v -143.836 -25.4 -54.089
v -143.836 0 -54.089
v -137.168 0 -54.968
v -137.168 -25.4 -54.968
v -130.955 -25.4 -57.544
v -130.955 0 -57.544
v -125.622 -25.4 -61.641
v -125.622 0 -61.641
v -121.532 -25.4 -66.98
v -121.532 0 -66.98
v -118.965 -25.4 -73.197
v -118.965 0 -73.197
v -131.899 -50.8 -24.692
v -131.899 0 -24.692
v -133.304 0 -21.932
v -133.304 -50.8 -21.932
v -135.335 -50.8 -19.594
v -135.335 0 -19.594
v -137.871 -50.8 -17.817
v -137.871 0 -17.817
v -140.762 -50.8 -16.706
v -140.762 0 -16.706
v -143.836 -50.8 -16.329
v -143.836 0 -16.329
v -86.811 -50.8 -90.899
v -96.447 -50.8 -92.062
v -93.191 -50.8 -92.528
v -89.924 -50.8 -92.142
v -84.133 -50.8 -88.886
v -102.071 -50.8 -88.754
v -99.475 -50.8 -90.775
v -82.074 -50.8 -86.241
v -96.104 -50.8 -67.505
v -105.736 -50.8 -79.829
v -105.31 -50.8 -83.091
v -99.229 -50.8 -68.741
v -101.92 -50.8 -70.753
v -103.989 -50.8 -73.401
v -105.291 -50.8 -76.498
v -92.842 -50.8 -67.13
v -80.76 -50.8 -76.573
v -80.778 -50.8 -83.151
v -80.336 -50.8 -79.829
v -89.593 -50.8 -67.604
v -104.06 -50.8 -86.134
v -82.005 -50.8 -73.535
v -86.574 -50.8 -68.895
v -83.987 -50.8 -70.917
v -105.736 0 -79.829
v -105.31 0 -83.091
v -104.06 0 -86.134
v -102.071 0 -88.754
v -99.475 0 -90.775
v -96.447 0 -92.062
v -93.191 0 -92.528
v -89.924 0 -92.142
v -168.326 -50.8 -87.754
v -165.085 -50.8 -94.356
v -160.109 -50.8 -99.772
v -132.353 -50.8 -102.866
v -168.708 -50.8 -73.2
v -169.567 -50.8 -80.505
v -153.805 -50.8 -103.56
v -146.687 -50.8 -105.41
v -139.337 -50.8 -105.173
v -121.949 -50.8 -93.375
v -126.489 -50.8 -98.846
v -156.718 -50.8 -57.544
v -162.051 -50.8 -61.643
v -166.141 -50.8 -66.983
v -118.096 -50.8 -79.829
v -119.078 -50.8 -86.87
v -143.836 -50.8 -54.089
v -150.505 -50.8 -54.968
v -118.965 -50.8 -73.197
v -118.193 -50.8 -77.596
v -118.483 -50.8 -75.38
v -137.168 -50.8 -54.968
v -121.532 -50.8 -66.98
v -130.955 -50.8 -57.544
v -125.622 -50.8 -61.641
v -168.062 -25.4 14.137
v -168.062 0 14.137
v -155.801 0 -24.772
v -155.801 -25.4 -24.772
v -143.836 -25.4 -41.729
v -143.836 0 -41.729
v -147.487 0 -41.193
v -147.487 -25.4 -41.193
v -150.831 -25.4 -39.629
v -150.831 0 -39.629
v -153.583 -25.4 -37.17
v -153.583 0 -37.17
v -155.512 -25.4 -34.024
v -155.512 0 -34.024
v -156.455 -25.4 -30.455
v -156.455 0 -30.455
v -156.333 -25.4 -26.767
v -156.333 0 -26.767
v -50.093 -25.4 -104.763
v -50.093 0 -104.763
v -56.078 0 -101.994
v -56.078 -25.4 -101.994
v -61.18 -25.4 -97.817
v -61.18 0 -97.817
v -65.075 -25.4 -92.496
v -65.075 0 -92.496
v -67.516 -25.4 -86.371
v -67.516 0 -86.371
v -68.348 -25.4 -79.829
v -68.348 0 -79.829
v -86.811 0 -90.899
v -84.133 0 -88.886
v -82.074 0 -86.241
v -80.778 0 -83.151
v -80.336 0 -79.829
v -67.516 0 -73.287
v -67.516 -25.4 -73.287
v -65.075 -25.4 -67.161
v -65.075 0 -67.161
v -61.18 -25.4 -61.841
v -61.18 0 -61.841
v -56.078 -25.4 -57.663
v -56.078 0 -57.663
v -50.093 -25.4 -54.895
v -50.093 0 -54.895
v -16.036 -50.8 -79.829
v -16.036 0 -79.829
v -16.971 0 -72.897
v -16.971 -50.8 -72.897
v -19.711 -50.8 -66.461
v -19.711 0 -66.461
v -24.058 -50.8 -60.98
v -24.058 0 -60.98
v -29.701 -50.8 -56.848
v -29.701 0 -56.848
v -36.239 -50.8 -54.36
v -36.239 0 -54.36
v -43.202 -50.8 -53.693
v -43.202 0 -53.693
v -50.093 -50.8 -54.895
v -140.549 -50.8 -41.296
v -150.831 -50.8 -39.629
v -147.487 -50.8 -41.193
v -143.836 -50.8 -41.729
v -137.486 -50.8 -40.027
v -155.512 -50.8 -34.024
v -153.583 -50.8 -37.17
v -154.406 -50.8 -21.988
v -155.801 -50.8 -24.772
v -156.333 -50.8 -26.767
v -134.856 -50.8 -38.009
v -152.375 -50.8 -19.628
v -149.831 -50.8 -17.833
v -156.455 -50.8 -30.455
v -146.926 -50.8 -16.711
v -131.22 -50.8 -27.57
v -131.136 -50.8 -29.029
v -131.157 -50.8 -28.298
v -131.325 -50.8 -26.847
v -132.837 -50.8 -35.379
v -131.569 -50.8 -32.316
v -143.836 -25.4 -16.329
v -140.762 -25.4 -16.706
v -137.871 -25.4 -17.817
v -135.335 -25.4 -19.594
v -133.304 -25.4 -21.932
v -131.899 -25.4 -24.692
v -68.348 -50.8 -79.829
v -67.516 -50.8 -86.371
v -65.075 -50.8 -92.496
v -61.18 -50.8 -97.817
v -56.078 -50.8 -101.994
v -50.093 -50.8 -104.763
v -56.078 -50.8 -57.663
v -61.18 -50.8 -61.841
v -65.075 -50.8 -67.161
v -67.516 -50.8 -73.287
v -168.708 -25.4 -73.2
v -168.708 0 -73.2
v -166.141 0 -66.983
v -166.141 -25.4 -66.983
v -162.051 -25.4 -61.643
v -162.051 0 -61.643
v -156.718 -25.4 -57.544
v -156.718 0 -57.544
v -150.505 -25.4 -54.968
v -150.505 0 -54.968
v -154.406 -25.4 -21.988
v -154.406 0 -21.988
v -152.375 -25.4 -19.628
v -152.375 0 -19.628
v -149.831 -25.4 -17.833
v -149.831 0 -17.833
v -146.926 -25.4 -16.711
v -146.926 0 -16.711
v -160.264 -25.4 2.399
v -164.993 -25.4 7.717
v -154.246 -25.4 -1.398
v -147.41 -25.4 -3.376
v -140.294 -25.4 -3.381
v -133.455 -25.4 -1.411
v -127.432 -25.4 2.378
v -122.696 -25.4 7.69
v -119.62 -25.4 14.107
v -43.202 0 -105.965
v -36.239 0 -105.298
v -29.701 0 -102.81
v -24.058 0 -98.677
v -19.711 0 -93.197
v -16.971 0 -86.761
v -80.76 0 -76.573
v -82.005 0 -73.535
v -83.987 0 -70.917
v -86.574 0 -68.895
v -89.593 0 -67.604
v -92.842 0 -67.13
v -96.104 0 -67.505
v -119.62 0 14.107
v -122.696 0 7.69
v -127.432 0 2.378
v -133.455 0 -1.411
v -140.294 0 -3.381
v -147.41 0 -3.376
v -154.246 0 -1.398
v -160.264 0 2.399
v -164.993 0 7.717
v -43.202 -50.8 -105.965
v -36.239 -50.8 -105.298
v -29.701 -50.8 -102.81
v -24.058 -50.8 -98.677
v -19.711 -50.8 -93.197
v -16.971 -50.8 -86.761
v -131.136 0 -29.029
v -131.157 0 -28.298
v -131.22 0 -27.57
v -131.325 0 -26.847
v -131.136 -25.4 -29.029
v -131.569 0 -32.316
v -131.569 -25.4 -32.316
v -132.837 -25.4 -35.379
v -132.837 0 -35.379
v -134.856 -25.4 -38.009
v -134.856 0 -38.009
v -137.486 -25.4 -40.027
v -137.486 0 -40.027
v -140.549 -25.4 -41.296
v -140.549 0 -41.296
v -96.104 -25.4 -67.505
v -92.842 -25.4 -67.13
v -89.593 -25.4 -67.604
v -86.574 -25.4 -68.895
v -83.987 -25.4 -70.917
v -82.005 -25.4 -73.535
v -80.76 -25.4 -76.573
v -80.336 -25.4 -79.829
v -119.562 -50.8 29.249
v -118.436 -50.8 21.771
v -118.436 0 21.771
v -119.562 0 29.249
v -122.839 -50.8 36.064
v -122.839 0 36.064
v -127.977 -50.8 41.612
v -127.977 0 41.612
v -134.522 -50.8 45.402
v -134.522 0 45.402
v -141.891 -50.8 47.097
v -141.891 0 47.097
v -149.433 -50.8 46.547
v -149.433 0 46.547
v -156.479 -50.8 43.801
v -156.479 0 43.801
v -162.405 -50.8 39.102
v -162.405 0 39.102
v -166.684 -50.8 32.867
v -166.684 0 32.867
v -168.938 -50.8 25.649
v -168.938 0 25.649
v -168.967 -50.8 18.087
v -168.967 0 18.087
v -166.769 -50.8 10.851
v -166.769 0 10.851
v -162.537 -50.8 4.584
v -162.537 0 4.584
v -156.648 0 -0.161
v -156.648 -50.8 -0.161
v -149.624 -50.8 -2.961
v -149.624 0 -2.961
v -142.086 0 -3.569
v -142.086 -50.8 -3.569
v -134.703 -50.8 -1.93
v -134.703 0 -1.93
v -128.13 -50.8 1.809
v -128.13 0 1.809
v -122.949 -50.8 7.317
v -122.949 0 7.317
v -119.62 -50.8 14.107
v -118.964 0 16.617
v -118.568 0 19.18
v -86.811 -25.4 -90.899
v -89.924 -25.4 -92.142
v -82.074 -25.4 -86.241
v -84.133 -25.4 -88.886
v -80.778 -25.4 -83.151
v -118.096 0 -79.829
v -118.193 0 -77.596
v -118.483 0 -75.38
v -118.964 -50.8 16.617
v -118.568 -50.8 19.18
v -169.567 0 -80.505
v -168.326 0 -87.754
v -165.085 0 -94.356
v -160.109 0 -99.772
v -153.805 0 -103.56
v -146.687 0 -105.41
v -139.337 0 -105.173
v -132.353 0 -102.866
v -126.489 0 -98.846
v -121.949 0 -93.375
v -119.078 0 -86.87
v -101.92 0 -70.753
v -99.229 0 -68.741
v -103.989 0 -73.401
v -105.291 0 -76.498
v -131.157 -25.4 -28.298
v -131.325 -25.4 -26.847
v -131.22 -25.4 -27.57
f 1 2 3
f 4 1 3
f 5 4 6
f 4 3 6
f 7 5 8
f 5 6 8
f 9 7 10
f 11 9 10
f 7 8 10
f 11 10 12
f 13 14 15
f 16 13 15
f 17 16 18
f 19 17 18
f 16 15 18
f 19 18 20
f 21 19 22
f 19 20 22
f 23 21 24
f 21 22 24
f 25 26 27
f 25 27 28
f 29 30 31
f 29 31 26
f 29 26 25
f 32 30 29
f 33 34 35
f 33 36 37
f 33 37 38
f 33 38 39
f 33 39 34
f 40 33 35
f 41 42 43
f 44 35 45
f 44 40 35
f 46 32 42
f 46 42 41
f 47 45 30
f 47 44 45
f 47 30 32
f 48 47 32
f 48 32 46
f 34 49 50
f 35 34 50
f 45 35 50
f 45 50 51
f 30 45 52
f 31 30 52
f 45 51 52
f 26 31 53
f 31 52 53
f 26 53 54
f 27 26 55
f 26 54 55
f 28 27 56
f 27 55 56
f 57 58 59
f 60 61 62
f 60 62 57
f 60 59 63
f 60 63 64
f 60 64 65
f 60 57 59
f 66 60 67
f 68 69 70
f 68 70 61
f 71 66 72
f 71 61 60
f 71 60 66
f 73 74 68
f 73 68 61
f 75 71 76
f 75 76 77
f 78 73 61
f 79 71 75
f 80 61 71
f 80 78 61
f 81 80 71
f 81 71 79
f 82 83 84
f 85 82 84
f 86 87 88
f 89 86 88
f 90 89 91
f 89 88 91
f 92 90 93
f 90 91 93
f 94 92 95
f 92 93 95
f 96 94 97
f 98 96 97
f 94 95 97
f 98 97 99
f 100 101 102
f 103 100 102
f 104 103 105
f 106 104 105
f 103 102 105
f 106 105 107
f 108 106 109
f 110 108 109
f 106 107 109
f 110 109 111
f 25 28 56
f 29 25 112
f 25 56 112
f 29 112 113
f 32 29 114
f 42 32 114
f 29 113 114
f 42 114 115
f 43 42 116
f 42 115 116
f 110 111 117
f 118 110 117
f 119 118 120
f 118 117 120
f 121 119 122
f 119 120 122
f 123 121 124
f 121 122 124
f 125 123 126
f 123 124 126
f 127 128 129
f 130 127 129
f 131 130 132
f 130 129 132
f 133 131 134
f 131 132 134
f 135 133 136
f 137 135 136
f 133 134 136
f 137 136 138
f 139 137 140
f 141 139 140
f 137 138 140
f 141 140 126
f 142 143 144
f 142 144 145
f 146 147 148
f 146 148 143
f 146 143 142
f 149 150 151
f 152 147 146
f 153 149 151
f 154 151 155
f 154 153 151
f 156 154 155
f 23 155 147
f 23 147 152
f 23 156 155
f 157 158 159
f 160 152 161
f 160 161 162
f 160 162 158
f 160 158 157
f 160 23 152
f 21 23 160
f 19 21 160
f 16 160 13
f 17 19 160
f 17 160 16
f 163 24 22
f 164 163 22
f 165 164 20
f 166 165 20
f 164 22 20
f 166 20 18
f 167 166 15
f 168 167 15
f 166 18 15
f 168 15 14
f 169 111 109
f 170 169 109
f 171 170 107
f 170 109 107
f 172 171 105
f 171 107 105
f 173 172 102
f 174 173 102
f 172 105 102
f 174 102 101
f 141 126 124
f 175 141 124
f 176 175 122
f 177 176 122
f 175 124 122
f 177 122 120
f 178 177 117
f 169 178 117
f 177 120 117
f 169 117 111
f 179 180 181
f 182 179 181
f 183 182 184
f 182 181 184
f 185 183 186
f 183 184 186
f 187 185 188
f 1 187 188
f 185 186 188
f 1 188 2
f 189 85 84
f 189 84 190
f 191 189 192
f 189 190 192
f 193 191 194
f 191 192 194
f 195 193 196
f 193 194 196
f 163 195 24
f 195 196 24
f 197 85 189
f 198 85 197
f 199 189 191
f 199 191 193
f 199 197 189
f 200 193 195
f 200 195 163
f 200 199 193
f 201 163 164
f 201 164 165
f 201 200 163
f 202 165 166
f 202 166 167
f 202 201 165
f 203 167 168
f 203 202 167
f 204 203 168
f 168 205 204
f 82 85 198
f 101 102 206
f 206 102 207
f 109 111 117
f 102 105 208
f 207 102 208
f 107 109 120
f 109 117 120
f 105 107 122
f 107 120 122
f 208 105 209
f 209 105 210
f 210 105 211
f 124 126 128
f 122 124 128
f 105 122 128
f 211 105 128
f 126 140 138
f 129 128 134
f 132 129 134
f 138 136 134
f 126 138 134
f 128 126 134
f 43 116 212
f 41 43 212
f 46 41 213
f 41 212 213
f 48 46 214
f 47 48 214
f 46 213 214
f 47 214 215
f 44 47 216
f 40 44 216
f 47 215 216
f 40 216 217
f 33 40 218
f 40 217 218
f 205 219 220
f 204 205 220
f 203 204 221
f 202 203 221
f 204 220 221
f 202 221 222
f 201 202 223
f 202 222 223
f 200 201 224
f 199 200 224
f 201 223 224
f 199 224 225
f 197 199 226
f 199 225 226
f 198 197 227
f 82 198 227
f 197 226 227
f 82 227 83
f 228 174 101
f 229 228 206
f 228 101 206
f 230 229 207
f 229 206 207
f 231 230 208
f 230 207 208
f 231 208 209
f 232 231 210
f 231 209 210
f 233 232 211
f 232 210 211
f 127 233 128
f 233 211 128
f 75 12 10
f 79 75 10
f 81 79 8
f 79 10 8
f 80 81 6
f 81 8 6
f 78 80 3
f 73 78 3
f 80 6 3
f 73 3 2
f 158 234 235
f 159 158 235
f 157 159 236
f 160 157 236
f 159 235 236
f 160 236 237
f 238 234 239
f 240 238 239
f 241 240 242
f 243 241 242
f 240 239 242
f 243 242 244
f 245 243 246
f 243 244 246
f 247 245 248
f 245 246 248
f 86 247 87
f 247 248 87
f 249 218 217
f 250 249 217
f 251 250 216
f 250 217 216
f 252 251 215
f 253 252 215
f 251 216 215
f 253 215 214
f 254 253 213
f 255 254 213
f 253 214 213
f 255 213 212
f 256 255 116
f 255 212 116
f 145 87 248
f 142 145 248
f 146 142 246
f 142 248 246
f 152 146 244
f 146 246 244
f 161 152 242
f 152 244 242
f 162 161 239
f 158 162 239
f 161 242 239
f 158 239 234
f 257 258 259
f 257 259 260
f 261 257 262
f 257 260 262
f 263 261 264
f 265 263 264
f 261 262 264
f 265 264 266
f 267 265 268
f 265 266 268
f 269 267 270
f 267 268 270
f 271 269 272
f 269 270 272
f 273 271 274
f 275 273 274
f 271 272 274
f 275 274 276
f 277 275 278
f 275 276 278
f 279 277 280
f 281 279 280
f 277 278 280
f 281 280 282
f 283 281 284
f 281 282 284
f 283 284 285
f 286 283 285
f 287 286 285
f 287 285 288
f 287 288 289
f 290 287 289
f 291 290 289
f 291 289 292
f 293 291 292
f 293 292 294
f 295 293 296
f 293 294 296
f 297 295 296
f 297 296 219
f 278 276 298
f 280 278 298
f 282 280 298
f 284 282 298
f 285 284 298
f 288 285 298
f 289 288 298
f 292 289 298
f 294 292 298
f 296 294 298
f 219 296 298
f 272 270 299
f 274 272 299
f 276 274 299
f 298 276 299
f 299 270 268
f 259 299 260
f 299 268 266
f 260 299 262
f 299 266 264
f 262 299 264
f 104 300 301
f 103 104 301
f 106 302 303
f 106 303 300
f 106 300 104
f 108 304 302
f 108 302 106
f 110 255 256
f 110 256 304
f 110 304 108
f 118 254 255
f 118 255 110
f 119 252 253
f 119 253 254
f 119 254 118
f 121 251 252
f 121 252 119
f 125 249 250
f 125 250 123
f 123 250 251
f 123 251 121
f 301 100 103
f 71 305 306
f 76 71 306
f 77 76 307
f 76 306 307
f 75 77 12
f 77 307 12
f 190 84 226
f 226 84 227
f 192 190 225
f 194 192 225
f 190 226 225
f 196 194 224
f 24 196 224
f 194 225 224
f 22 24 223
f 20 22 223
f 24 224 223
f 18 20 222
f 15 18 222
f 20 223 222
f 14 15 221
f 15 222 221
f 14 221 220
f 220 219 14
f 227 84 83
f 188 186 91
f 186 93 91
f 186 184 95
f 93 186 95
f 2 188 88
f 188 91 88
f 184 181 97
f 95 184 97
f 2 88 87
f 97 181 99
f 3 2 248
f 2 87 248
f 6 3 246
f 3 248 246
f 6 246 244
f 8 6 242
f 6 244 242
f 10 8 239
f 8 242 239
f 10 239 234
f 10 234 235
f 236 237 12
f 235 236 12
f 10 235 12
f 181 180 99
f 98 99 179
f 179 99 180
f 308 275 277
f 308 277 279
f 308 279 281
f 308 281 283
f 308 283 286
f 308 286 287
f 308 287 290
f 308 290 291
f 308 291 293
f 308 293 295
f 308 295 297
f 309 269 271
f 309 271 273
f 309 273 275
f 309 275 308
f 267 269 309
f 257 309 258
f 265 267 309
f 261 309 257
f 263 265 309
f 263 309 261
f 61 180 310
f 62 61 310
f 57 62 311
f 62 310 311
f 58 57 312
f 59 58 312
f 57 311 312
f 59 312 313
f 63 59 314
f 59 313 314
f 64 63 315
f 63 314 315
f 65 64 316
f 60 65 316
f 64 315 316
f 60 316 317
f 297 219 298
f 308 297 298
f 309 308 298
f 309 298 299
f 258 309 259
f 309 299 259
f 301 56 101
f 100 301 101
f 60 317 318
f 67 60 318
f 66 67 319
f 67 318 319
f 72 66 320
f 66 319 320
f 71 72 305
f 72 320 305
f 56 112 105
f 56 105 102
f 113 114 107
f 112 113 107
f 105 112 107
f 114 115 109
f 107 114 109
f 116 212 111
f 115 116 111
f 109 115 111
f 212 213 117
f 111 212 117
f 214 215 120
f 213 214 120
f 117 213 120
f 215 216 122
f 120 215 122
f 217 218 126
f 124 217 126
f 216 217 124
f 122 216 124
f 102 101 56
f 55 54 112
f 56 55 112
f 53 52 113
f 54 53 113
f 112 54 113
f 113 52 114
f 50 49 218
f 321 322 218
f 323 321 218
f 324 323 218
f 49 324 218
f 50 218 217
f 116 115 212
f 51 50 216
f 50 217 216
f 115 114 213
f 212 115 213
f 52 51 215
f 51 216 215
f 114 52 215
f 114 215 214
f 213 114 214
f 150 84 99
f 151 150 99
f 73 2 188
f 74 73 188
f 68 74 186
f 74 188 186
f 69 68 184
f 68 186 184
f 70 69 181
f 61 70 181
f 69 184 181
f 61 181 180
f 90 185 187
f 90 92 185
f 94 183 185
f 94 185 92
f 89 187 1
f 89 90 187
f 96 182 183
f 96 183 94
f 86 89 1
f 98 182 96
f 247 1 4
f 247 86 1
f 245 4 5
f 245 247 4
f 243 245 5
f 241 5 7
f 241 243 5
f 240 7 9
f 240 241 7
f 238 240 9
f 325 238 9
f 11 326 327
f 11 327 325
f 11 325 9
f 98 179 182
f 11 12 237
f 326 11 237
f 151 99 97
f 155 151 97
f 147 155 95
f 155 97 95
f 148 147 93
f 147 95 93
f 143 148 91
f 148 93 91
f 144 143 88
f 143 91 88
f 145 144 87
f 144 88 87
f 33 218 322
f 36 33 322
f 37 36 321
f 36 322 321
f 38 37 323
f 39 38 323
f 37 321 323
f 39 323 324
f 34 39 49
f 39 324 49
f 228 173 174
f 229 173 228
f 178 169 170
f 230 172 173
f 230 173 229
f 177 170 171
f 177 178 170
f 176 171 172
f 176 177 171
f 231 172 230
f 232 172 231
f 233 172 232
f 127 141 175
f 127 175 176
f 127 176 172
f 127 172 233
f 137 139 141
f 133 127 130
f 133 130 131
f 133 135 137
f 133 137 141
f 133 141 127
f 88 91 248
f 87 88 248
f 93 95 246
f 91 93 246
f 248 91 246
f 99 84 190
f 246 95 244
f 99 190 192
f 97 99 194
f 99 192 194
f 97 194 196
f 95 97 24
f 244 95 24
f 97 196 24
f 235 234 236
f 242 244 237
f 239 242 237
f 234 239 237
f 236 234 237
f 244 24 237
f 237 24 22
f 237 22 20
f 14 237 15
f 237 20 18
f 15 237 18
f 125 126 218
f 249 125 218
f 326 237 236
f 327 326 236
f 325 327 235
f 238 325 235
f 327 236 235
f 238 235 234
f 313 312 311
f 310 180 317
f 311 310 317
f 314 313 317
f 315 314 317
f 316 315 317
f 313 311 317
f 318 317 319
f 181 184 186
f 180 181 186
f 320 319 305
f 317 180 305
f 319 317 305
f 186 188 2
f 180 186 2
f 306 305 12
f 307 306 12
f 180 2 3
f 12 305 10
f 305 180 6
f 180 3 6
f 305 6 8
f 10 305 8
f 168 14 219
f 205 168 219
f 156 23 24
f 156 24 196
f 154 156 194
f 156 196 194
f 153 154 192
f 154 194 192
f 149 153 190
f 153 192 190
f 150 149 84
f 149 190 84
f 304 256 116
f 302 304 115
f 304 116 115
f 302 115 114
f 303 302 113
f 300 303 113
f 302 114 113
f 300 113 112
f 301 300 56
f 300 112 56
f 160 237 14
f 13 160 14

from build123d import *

# Parameters (mm, degrees)
F1_DEPTH = 50.8
F2_DEPTH = 25.4


with BuildPart() as f1:
    # F0 (on Front) → F1 (new body)
    with BuildSketch(Plane.XZ):
        with BuildLine():
            ThreePointArc((-143.8358277082, -3.6288881779), (-128.8277068485, 1.2792522613), (-119.6197407059, 14.1068355812))
            ThreePointArc((-119.6197407059, 14.1068355812), (-118.7335508209, 17.8935230004), (-118.4358277082, 21.7711118221))
            ThreePointArc((-118.4358277082, 21.7711118221), (-147.697549299, 46.875834612), (-168.0615841142, 14.1374543396))
            ThreePointArc((-168.0615841142, 14.1374543396), (-158.8568979089, 1.2887425737), (-143.8358277082, -3.6288881779))
        make_face()
    extrude(amount=F1_DEPTH)


with BuildPart() as f1b:
    # F0 (on Front) → F1, piece 2 (new body)
    with BuildSketch(Plane.XZ):
        with BuildLine():
            Line((-143.8358277082, -29.0288881779), (-143.8358277082, -41.7288881779))
            ThreePointArc((-143.8358277082, -41.7288881779), (-134.8555715872, -38.0091442989), (-131.1358277082, -29.0288881779))
            ThreePointArc((-131.1358277082, -29.0288881779), (-131.1831357698, -27.9337230252), (-131.3247075054, -26.8467169498))
            Line((-131.3247075054, -26.8467169498), (-131.8993329423, -24.6918278022))
            ThreePointArc((-131.8993329423, -24.6918278022), (-136.5485328319, -18.627670298), (-143.8358277082, -16.3288881779))
            Line((-143.8358277082, -16.3288881779), (-143.8358277082, -29.0288881779))
        make_face()
        with BuildLine():
            ThreePointArc((-156.3327125795, -26.7666175232), (-153.5831565042, -37.1701154406), (-143.8358277082, -41.7288881779))
            Line((-143.8358277082, -41.7288881779), (-143.8358277082, -29.0288881779))
            Line((-143.8358277082, -29.0288881779), (-143.8358277082, -16.3288881779))
            ThreePointArc((-143.8358277082, -16.3288881779), (-151.1578861803, -18.6521131619), (-155.8010802151, -24.7718079052))
            Line((-155.8010802151, -24.7718079052), (-156.3327125795, -26.7666175232))
        make_face()
    extrude(amount=F1_DEPTH)


with BuildPart() as f1c:
    # F0 (on Front) → F1, piece 3 (new body)
    with BuildSketch(Plane.XZ):
        with BuildLine():
            Line((-93.0358277082, -79.8288881779), (-105.7358277082, -79.8288881779))
            ThreePointArc((-105.7358277082, -79.8288881779), (-100.8386115233, -89.8491957946), (-89.9237702697, -92.1416903975))
            ThreePointArc((-89.9237702697, -92.1416903975), (-83.0155200915, -87.631671993), (-80.3358277082, -79.8288881779))
            Line((-80.3358277082, -79.8288881779), (-93.0358277082, -79.8288881779))
        make_face()
        with BuildLine():
            ThreePointArc((-96.1040924171, -67.505100137), (-103.0422496912, -72.008305137), (-105.7358277082, -79.8288881779))
            Line((-105.7358277082, -79.8288881779), (-93.0358277082, -79.8288881779))
            Line((-93.0358277082, -79.8288881779), (-80.3358277082, -79.8288881779))
            ThreePointArc((-80.3358277082, -79.8288881779), (-85.2152446674, -69.8224661949), (-96.1040924171, -67.505100137))
        make_face()
    extrude(amount=F1_DEPTH)


with BuildPart() as f1d:
    # F0 (on Front) → F1, piece 4 (new body)
    with BuildSketch(Plane.XZ):
        with BuildLine():
            ThreePointArc((-16.0361095198, -79.8288881779), (-26.7407291226, -58.7247316021), (-50.0925403314, -54.8949510746))
            ThreePointArc((-50.0925403314, -54.8949510746), (-63.295997284, -64.3777765923), (-68.3475718968, -79.8288881779))
            ThreePointArc((-68.3475718968, -79.8288881779), (-63.295997284, -95.2799997635), (-50.0925403314, -104.7628252812))
            ThreePointArc((-50.0925403314, -104.7628252812), (-26.7407291226, -100.9330447536), (-16.0361095198, -79.8288881779))
        make_face()
    extrude(amount=F1_DEPTH)


with BuildPart() as f1e:
    # F0 (on Front) → F1, piece 5 (new body)
    with BuildSketch(Plane.XZ):
        with BuildLine():
            Line((-118.0958620819, -79.8288881779), (-143.8358277082, -79.8288881779))
            Line((-143.8358277082, -79.8288881779), (-143.8358277082, -54.0889225515))
            ThreePointArc((-143.8358277082, -54.0889225515), (-159.5190585492, -59.4185451911), (-168.7076651652, -73.2003489753))
            ThreePointArc((-168.7076651652, -73.2003489753), (-160.1093223522, -99.7717867265), (-132.3532357975, -102.8657263606))
            ThreePointArc((-132.3532357975, -102.8657263606), (-121.9485328602, -93.3748157829), (-118.0958620819, -79.8288881779))
        make_face()
        with BuildLine():
            Line((-143.8358277082, -54.0889225515), (-143.8358277082, -79.8288881779))
            Line((-143.8358277082, -79.8288881779), (-118.0958620819, -79.8288881779))
            ThreePointArc((-118.0958620819, -79.8288881779), (-118.314056375, -76.4844871163), (-118.9649400459, -73.196786148))
            ThreePointArc((-118.9649400459, -73.196786148), (-128.1540588003, -59.4174219306), (-143.8358277082, -54.0889225515))
        make_face()
    extrude(amount=F1_DEPTH)


with BuildPart() as f2:
    # F0 (on Front) → F2 (new body)
    with BuildSketch(Plane.XZ):
        with BuildLine():
            ThreePointArc((-155.8010802151, -24.7718079052), (-151.1578861803, -18.6521131619), (-143.8358277082, -16.3288881779))
            Line((-143.8358277082, -16.3288881779), (-143.8358277082, -3.6288881779))
            ThreePointArc((-143.8358277082, -3.6288881779), (-158.8568979089, 1.2887425737), (-168.0615841142, 14.1374543396))
            Line((-168.0615841142, 14.1374543396), (-155.8010802151, -24.7718079052))
        make_face()
        with BuildLine():
            ThreePointArc((-143.8358277082, -16.3288881779), (-136.5485328319, -18.627670298), (-131.8993329423, -24.6918278022))
            Line((-131.8993329423, -24.6918278022), (-119.6197407059, 14.1068355812))
            ThreePointArc((-119.6197407059, 14.1068355812), (-128.8277068485, 1.2792522613), (-143.8358277082, -3.6288881779))
            Line((-143.8358277082, -3.6288881779), (-143.8358277082, -16.3288881779))
        make_face()
    extrude(amount=F2_DEPTH)


with BuildPart() as f2b:
    # F0 (on Front) → F2, piece 2 (new body)
    with BuildSketch(Plane.XZ):
        with BuildLine():
            ThreePointArc((-168.7076651652, -73.2003489753), (-159.5190585492, -59.4185451911), (-143.8358277082, -54.0889225515))
            Line((-143.8358277082, -54.0889225515), (-143.8358277082, -41.7288881779))
            ThreePointArc((-143.8358277082, -41.7288881779), (-153.5831565042, -37.1701154406), (-156.3327125795, -26.7666175232))
            Line((-156.3327125795, -26.7666175232), (-168.7076651652, -73.2003489753))
        make_face()
        with BuildLine():
            Line((-143.8358277082, -41.7288881779), (-143.8358277082, -54.0889225515))
            ThreePointArc((-143.8358277082, -54.0889225515), (-128.1540588003, -59.4174219306), (-118.9649400459, -73.196786148))
            Line((-118.9649400459, -73.196786148), (-131.3247075054, -26.8467169498))
            ThreePointArc((-131.3247075054, -26.8467169498), (-131.1831357698, -27.9337230252), (-131.1358277082, -29.0288881779))
            ThreePointArc((-131.1358277082, -29.0288881779), (-134.8555715872, -38.0091442989), (-143.8358277082, -41.7288881779))
        make_face()
    extrude(amount=F2_DEPTH)


with BuildPart() as f2c:
    # F0 (on Front) → F2, piece 3 (new body)
    with BuildSketch(Plane.XZ):
        with BuildLine():
            Line((-50.0925403314, -54.8949510746), (-96.1040924171, -67.505100137))
            ThreePointArc((-96.1040924171, -67.505100137), (-85.2152446674, -69.8224661949), (-80.3358277082, -79.8288881779))
            Line((-80.3358277082, -79.8288881779), (-68.3475718968, -79.8288881779))
            ThreePointArc((-68.3475718968, -79.8288881779), (-63.295997284, -64.3777765923), (-50.0925403314, -54.8949510746))
        make_face()
        with BuildLine():
            ThreePointArc((-80.3358277082, -79.8288881779), (-83.0155200915, -87.631671993), (-89.9237702697, -92.1416903975))
            Line((-89.9237702697, -92.1416903975), (-50.0925403314, -104.7628252812))
            ThreePointArc((-50.0925403314, -104.7628252812), (-63.295997284, -95.2799997635), (-68.3475718968, -79.8288881779))
            Line((-68.3475718968, -79.8288881779), (-80.3358277082, -79.8288881779))
        make_face()
    extrude(amount=F2_DEPTH)


solid = Compound([f1.part, f1b.part, f1c.part, f1d.part, f1e.part, f2.part, f2b.part, f2c.part])
